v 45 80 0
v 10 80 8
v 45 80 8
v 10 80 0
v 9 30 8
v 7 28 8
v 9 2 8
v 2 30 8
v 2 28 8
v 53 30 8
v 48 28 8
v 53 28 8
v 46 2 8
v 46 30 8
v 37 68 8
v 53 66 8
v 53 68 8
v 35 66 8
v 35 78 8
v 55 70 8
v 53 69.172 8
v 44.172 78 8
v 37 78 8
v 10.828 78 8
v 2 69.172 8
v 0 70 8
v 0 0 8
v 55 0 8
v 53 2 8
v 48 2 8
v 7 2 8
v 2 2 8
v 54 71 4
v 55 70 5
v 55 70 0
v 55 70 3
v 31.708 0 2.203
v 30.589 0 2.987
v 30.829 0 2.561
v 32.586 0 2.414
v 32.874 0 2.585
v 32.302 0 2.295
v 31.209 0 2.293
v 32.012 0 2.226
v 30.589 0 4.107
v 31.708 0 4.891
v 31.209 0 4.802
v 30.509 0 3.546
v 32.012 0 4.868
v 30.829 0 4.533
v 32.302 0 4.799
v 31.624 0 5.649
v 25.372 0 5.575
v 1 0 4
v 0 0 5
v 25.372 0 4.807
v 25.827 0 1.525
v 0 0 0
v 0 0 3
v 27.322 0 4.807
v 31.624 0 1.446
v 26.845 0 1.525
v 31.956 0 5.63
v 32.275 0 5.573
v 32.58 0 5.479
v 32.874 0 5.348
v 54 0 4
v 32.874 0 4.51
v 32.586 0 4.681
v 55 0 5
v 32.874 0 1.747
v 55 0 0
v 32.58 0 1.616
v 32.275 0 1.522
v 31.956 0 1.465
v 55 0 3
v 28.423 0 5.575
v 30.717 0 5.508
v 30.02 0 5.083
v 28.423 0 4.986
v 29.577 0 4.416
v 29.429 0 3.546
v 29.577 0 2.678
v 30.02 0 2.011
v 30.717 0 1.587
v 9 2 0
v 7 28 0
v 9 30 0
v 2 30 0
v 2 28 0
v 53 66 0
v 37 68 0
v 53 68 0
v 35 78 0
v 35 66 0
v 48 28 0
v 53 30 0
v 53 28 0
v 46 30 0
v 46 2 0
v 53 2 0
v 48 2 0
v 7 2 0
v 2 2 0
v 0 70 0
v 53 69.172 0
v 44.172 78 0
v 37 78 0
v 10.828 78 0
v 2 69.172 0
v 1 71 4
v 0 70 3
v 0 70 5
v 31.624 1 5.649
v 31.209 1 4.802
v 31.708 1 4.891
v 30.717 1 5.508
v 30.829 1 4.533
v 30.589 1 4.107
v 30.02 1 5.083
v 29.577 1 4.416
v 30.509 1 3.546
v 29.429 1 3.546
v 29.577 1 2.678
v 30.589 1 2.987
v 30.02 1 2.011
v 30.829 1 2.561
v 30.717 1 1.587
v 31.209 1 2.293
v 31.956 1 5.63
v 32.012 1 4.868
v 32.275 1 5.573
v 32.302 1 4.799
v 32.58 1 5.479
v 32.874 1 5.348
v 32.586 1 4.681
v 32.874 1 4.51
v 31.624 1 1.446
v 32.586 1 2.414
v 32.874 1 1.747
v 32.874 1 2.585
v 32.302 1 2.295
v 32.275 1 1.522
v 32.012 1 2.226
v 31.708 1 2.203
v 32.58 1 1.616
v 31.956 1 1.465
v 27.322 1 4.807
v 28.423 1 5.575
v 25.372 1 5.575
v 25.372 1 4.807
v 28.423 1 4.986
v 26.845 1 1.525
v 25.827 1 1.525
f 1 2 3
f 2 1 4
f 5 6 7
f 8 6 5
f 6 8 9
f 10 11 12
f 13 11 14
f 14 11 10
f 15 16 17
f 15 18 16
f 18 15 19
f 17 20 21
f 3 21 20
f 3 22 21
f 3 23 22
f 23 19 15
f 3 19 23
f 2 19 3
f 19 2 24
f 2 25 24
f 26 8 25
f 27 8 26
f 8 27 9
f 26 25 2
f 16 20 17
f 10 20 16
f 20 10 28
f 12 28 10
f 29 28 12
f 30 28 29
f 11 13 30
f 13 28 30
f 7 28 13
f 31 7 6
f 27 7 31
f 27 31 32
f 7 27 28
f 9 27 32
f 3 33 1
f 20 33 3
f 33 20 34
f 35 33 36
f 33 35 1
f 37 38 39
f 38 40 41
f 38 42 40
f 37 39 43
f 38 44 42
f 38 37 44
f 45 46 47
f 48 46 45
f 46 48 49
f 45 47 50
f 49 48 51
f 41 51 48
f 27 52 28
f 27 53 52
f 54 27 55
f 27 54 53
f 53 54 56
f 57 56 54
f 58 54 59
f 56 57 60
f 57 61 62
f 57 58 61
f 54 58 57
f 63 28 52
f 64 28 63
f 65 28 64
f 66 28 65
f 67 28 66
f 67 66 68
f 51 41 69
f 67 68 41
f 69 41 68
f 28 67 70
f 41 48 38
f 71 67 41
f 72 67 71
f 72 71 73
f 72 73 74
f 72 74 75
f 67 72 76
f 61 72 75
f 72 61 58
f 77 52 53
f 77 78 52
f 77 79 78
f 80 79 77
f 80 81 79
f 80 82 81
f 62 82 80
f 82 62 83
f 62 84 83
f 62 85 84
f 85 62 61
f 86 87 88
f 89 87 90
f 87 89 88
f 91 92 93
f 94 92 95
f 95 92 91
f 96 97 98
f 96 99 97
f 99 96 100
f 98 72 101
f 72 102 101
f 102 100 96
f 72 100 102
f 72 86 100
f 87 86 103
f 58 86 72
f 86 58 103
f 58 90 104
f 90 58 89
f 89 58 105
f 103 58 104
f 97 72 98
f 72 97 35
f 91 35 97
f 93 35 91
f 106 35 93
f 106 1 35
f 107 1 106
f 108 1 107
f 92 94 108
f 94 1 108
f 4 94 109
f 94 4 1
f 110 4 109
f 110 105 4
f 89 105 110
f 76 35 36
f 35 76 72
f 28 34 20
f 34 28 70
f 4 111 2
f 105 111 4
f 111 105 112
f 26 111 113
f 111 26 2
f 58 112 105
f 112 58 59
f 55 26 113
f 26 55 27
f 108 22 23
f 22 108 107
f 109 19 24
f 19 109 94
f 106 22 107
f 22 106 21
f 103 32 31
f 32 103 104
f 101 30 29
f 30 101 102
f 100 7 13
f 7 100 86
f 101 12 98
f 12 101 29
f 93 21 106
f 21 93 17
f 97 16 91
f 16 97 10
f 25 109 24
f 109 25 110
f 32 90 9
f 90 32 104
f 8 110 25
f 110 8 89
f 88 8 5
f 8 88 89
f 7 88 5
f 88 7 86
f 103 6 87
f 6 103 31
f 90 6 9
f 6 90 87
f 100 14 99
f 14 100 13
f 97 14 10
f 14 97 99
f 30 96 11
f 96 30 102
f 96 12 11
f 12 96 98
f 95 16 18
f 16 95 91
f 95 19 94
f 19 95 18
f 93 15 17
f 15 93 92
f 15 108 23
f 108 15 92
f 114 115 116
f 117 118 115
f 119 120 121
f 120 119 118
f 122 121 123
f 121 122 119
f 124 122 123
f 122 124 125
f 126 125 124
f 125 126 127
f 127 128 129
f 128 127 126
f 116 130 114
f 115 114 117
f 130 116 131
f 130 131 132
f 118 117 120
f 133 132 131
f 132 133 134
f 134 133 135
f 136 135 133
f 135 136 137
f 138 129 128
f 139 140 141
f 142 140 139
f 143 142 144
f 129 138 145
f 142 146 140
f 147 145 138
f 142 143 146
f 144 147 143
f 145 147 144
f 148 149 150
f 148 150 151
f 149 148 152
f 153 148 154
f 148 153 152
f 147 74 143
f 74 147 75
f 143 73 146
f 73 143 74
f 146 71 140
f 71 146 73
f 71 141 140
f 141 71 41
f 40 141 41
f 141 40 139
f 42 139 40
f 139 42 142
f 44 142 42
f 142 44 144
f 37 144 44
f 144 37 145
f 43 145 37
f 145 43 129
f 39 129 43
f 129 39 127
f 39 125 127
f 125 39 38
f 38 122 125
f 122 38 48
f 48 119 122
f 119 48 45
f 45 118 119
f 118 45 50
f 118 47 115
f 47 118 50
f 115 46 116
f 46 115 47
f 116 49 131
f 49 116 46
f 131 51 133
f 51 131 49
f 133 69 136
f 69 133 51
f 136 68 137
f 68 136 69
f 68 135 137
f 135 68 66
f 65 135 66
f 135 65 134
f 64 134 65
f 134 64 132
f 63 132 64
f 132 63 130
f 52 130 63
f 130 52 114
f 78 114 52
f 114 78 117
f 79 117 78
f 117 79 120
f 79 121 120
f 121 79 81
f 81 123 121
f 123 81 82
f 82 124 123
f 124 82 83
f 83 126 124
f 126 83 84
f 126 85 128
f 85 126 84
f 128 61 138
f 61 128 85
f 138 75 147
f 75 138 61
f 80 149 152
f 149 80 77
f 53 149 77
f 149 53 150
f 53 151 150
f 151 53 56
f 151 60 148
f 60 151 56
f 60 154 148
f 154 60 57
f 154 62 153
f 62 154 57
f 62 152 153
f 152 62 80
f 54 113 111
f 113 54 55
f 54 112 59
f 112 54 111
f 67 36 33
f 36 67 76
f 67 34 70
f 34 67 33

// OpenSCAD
tol=0.25;

difference(){   // cut the board and components out of 
    // the base plate #1

union(){    

// Base 1 plate
difference(){
    B1p=[ [0,0], [55,0], [55,70], [45,80],
    [10,80], [0,70] ];
    translate([0,0,0]) color("gray")
    linear_extrude(height=8)
    polygon(points=B1p);

    // cutout an offset
    translate([0,0,-1]) color("blue"){
        difference(){
            linear_extrude(height=12)
            offset(r=-2) polygon(points=B1p);
        }
    }
}

// left
translate([0,0,0]) color("gray")
difference(){
    linear_extrude(height=8)
    square([9,30]);

    linear_extrude(height=10)
    offset(r=-2) square([9,30]);
}

// right
translate([46,0,0]) color("gray")
difference(){
    linear_extrude(height=8)
    square([9,30]);

    linear_extrude(height=10)
    offset(r=-2) square([9,30]);
}

// top
pt1=[ [0,0], [20,0], [20,4], [10,14], [0,14] ];
translate([35,66,0]) color("gray")
difference(){
    linear_extrude(height=8)
    polygon(points=pt1);

    linear_extrude(height=10)
    offset(r=-2) polygon(points=pt1);
}


} // end base union


// add text
translate ([25,1,3.5]) color("red") 
    rotate([90,0,0])
    linear_extrude(height=1){
    text("7C", font = "Open Sans:style=Bold", size=4,halign="left",valign="center",spacing=1.1);
    }

// side grooves
    pg1=[ [0,0], [1,1], [0,2] ];
    translate([0,0,5]) color("orange")
    rotate([90,180,180]) linear_extrude(height=80) polygon(points=pg1);

    translate([55,0,3]) color("orange")
    rotate([90,0,180]) linear_extrude(height=80) polygon(points=pg1);
    
} // end of diffence
